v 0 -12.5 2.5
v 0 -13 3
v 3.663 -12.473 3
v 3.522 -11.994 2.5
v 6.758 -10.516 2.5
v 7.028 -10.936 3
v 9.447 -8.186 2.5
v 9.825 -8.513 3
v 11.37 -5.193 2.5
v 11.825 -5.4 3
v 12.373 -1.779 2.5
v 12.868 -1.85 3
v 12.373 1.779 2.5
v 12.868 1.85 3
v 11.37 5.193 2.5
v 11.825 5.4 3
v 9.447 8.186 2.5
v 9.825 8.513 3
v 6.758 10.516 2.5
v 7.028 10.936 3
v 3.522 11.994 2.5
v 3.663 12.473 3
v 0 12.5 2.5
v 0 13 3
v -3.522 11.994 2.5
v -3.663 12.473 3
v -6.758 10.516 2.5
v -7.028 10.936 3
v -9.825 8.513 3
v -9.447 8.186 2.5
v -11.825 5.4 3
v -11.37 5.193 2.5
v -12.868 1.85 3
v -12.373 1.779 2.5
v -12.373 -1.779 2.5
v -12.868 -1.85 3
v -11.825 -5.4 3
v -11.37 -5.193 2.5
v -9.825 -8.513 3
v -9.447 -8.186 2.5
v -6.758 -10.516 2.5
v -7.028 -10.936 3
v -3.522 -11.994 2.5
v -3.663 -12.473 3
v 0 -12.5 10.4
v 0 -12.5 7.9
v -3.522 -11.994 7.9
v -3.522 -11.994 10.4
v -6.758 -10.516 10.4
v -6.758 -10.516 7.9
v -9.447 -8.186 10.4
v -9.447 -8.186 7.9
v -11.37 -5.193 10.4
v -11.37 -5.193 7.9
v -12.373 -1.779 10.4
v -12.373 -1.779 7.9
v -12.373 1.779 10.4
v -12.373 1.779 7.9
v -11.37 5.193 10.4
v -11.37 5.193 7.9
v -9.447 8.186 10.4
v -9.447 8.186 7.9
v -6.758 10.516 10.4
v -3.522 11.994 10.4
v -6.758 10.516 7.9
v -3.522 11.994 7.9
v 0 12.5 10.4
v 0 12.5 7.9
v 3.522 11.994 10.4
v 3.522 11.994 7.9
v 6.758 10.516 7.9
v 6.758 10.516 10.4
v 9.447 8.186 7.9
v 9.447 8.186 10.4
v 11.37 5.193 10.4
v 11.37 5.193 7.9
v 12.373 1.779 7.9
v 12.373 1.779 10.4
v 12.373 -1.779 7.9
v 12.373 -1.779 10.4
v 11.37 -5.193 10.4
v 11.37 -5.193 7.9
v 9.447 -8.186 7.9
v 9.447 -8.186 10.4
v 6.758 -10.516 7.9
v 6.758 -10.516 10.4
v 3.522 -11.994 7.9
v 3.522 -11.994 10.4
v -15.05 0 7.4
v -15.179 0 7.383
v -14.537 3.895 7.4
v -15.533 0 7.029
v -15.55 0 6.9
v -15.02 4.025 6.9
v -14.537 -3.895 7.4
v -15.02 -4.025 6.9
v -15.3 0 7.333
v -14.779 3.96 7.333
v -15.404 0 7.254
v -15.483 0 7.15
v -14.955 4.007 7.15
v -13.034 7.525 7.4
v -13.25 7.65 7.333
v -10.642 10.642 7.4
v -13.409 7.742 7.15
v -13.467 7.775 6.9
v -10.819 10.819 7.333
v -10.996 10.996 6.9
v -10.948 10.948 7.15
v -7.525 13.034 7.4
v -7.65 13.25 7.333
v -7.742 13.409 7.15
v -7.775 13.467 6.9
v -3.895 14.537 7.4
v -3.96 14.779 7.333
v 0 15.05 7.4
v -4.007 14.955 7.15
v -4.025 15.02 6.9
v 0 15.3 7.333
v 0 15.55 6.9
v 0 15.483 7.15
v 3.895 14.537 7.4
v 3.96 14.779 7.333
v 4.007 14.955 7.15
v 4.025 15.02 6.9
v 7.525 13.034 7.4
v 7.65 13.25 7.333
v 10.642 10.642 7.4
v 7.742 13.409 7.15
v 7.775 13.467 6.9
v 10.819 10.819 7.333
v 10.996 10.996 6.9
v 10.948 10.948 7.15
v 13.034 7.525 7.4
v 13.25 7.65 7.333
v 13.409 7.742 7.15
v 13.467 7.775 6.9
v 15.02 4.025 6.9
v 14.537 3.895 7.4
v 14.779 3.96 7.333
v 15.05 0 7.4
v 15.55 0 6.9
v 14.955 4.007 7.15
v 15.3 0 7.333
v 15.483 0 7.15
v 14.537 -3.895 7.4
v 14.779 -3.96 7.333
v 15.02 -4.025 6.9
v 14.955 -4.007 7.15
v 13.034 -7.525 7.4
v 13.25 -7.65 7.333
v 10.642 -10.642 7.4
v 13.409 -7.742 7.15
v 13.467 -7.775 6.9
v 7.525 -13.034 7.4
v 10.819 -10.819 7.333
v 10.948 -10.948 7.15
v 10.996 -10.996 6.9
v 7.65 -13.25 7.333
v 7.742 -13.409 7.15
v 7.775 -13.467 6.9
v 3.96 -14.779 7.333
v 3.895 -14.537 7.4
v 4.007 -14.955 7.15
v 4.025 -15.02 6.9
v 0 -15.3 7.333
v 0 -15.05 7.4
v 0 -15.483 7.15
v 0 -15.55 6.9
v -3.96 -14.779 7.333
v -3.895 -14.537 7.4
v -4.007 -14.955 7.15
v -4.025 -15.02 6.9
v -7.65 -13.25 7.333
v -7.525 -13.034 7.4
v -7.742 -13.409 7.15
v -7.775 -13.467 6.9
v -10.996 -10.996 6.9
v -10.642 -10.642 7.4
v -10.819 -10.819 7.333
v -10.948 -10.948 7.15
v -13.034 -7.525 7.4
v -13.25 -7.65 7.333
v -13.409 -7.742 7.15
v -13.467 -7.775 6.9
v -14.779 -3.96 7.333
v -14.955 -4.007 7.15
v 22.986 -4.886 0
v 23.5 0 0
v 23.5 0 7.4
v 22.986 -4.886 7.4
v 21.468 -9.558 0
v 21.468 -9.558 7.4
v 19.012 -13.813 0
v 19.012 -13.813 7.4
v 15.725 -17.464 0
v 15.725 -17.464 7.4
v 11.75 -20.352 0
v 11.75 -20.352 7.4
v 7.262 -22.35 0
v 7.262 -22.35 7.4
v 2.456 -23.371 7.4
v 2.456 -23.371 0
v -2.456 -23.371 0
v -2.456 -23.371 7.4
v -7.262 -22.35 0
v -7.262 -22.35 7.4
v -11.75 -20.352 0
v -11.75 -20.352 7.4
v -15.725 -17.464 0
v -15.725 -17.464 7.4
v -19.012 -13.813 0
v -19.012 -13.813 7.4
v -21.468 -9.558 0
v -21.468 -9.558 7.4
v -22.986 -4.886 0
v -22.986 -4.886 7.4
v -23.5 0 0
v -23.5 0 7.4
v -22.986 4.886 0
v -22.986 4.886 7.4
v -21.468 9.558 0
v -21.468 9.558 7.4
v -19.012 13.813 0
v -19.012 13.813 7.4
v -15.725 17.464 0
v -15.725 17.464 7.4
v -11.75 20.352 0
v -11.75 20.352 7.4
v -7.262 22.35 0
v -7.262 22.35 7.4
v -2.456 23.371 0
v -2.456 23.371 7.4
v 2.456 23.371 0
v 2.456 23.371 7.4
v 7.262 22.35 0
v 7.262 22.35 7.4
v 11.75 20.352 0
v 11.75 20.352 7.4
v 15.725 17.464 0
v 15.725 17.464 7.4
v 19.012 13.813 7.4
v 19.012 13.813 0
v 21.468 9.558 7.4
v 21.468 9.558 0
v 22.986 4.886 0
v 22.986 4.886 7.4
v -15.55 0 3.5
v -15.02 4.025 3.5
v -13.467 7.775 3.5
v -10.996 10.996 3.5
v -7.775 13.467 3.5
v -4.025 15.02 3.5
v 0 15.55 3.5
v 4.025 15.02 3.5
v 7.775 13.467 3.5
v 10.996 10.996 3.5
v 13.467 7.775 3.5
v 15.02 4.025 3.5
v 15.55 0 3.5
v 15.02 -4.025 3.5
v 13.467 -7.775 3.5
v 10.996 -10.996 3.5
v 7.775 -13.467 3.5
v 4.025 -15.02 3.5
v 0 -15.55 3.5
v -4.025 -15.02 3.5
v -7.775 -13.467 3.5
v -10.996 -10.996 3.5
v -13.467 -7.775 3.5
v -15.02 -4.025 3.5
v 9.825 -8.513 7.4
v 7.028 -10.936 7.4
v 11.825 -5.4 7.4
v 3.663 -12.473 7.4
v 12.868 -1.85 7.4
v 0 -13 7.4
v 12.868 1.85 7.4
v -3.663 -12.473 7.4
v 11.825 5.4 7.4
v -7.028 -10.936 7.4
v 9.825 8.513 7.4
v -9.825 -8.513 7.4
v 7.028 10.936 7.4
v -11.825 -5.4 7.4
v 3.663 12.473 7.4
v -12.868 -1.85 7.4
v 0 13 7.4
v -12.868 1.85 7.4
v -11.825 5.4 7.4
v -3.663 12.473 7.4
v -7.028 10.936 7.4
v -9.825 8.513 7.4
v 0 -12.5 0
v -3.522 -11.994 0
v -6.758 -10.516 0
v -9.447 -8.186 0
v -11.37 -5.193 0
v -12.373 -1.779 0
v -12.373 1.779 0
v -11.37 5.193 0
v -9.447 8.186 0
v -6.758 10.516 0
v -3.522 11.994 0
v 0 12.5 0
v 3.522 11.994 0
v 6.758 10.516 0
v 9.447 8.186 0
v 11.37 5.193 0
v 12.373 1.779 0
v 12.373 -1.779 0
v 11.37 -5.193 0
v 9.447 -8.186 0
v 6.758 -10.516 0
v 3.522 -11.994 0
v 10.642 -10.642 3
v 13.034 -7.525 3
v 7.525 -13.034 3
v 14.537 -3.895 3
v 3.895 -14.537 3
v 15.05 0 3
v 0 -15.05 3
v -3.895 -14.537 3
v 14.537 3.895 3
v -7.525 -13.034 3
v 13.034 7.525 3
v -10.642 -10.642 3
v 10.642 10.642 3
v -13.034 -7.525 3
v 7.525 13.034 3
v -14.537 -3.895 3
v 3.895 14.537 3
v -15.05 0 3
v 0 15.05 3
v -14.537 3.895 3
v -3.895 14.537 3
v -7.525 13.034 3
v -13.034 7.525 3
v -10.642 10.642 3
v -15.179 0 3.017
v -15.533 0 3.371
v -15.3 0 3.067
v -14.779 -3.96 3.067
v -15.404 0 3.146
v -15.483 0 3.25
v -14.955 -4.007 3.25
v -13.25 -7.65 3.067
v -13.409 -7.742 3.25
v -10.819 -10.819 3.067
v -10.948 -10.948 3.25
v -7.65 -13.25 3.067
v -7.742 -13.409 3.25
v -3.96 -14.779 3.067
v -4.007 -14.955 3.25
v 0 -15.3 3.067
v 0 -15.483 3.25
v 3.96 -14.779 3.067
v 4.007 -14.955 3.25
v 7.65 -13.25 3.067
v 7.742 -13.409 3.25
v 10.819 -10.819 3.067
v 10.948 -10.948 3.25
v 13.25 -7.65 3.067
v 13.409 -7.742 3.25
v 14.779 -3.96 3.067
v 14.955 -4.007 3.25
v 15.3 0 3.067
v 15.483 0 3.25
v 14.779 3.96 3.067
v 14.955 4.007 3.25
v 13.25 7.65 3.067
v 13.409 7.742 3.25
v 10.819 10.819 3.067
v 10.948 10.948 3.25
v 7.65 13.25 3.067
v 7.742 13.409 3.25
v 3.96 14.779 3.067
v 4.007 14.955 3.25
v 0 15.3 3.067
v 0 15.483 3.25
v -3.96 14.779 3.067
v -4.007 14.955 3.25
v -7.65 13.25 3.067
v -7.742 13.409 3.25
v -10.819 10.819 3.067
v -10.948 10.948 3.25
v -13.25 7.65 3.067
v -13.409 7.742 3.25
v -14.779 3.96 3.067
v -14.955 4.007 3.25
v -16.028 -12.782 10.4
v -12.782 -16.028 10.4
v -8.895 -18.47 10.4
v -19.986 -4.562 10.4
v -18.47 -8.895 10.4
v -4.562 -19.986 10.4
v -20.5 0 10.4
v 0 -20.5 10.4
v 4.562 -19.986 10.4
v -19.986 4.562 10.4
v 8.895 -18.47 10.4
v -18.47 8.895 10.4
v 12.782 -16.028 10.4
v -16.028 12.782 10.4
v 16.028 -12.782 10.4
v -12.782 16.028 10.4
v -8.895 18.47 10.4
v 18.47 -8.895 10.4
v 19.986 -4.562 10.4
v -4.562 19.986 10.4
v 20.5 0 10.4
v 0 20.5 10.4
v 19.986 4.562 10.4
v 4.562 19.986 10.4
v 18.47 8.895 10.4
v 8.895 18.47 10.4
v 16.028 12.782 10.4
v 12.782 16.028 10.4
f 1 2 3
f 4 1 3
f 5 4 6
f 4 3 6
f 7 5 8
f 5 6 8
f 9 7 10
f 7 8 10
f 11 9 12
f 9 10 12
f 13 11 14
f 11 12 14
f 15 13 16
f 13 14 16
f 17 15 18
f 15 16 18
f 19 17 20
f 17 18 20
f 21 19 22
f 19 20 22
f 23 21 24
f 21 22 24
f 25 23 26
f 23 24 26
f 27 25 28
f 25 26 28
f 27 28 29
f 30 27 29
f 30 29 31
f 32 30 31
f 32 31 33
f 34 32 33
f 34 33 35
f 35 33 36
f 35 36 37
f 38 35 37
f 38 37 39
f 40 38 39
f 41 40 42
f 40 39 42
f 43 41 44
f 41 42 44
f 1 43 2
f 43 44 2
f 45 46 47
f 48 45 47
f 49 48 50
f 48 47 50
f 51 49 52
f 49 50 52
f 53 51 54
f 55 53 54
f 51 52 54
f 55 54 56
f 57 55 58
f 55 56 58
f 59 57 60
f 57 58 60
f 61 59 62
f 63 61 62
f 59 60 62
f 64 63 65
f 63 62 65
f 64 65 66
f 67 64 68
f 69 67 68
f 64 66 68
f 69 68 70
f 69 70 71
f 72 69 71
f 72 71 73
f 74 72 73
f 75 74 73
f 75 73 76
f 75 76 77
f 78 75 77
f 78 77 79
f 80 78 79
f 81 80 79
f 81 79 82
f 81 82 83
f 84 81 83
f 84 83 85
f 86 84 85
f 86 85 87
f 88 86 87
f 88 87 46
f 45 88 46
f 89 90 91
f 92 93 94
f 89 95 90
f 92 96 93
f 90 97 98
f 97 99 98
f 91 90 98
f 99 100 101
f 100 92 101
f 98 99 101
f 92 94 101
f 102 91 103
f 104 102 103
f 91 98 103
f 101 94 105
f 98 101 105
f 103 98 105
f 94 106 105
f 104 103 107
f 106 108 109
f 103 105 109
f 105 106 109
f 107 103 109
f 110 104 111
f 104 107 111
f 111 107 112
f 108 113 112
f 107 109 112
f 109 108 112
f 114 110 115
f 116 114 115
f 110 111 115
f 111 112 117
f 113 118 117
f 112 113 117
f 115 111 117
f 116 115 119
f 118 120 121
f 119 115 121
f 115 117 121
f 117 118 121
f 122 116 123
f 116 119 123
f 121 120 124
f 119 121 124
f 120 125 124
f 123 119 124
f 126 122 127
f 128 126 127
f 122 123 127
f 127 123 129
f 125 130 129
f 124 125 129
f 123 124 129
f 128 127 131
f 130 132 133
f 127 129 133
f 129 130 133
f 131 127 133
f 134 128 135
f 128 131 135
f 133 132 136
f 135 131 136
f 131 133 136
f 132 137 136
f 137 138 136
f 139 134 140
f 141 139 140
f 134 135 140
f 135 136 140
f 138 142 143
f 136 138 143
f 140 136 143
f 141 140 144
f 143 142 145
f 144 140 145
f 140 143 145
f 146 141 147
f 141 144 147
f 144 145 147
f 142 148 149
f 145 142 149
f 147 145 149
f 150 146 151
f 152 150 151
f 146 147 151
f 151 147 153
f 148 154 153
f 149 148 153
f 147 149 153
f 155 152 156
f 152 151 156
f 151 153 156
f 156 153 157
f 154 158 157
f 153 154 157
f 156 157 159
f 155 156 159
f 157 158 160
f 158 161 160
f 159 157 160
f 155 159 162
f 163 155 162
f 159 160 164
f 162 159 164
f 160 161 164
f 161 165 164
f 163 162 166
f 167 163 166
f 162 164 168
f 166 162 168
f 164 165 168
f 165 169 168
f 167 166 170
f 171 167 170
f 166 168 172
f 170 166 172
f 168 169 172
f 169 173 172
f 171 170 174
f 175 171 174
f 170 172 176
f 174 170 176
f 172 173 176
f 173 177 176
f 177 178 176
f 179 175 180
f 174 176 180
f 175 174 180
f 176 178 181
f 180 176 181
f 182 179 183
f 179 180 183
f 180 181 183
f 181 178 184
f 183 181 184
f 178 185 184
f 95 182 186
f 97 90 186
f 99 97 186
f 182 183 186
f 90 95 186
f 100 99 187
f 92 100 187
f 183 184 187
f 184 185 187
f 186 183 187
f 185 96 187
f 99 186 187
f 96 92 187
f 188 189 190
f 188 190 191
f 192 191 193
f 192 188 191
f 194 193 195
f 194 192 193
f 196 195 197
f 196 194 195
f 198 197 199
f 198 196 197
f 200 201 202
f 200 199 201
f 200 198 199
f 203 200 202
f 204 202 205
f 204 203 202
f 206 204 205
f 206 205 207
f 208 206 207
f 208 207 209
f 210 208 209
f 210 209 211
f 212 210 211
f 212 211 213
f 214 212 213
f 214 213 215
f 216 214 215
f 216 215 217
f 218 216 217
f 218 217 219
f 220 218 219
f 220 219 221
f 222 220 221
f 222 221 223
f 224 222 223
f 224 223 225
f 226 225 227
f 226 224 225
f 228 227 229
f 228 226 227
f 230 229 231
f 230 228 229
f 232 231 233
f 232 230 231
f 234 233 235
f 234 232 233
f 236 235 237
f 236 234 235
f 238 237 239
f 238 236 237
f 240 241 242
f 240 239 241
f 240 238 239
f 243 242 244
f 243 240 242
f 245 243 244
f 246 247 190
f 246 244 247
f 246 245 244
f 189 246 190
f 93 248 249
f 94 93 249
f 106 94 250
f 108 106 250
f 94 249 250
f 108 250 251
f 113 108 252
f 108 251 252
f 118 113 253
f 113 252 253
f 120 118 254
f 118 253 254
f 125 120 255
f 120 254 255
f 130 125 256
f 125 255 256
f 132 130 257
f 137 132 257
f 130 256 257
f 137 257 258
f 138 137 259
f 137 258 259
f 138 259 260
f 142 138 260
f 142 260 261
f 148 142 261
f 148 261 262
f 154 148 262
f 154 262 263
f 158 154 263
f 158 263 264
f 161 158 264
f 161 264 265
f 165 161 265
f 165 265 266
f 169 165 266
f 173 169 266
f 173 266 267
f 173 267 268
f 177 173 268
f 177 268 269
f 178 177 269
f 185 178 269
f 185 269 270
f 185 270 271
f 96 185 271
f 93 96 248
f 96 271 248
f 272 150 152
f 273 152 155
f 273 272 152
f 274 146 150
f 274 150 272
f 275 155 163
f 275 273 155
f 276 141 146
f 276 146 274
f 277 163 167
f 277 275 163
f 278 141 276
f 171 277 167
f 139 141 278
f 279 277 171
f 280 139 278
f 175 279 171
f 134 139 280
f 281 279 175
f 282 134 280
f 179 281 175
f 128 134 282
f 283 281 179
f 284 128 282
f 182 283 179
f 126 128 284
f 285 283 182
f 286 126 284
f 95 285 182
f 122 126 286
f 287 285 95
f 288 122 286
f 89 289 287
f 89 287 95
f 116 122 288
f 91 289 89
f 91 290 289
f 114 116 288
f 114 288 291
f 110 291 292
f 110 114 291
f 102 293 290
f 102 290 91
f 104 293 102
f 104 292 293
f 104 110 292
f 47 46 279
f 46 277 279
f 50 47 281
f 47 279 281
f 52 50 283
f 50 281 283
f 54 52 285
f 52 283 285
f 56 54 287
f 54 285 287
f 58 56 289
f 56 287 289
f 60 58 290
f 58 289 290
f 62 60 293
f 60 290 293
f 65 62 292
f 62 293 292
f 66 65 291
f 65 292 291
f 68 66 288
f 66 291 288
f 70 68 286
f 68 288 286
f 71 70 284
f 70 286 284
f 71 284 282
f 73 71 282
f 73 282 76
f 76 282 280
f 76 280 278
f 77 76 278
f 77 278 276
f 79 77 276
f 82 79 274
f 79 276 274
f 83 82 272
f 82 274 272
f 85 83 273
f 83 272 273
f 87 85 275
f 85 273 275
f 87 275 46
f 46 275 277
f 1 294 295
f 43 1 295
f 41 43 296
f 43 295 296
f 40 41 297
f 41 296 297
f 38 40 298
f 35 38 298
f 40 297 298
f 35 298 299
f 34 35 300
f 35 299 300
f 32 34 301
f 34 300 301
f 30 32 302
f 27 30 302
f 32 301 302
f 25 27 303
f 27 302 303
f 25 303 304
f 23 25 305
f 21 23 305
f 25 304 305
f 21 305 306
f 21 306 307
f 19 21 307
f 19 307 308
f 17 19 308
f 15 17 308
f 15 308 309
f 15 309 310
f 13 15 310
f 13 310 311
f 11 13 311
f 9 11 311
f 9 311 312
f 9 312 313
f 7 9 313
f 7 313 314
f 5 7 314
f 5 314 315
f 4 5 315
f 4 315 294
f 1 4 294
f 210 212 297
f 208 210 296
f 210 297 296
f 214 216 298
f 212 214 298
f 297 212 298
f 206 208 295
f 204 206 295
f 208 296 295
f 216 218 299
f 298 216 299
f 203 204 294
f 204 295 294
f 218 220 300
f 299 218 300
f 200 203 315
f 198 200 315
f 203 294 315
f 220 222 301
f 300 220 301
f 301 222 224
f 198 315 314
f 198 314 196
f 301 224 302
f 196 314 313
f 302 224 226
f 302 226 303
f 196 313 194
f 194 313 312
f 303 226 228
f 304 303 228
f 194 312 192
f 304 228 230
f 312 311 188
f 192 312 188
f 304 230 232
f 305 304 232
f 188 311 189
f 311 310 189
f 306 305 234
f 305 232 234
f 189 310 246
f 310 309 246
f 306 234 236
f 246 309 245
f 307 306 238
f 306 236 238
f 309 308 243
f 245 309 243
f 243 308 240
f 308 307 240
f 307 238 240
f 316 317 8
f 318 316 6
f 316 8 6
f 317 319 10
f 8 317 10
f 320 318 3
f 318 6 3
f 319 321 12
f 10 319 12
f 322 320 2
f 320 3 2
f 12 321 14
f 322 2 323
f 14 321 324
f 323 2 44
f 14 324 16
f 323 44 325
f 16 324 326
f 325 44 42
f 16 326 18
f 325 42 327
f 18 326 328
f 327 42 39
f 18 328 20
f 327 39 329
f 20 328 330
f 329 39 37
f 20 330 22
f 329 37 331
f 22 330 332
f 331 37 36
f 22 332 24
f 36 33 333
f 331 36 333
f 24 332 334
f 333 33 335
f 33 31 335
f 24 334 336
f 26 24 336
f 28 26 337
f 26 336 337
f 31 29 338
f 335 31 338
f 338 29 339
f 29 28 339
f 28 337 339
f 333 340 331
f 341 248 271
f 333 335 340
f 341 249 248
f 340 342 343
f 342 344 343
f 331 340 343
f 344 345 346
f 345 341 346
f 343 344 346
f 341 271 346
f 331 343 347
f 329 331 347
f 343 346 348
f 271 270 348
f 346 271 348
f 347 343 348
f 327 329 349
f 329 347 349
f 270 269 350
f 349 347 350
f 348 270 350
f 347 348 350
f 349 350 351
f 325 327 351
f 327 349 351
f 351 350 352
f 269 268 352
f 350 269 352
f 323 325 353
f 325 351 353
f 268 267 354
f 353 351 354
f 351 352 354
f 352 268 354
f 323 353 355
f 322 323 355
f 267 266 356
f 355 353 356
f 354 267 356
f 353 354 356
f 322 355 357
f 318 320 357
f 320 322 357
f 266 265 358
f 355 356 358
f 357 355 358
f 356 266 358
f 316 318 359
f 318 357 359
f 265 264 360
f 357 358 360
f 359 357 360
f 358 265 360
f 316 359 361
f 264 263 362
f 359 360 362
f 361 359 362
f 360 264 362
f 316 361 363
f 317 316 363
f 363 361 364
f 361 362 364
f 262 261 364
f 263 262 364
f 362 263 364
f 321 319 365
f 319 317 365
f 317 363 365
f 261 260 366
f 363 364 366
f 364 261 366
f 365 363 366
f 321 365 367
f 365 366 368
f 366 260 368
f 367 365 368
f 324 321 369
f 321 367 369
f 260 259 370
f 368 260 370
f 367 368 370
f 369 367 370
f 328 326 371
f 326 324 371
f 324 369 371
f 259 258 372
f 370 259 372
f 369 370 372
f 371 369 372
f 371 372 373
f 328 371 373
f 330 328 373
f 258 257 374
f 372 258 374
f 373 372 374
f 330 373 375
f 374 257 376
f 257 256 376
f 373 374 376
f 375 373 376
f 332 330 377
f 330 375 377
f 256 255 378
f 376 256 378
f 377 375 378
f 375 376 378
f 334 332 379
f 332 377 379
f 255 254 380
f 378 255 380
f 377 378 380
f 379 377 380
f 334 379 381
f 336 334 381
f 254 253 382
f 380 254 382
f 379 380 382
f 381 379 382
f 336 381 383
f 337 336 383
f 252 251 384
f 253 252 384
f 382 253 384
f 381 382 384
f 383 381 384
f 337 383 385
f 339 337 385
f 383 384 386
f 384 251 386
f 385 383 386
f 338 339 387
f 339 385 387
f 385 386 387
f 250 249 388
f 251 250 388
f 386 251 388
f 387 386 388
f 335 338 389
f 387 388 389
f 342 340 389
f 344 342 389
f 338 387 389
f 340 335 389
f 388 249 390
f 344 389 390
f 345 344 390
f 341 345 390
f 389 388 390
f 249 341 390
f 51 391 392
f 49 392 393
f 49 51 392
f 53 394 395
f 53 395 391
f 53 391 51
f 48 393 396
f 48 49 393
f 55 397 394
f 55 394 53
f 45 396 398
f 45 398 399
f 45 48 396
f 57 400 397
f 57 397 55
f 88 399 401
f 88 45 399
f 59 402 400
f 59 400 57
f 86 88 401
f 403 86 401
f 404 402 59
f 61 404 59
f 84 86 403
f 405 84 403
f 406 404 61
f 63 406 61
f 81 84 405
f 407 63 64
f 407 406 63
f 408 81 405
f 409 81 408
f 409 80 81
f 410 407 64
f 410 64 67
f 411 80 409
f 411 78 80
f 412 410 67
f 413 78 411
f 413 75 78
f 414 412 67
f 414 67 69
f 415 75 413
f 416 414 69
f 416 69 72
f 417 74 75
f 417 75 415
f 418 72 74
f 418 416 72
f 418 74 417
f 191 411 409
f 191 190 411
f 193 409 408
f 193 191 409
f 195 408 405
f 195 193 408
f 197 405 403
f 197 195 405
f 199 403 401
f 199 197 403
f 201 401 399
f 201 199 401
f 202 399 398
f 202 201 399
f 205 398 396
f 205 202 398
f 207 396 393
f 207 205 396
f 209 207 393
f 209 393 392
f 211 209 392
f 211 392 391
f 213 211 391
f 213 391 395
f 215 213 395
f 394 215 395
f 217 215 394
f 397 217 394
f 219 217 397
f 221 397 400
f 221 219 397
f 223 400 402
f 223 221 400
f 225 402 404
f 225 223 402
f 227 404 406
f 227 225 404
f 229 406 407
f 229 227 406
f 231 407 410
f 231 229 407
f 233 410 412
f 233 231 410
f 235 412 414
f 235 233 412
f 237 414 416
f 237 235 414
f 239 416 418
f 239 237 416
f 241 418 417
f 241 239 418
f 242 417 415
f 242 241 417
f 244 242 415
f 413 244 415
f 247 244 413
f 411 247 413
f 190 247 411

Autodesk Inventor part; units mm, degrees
ref_plane "YZ Plane" through (0, 0, 0) normal (1, 0, 0) x (0, 1, 0)
ref_plane "XZ Plane" through (0, 0, 0) normal (0, 1, 0) x (-1, 0, 0)
ref_plane "XY Plane" through (0, 0, 0) normal (0, 0, 1) x (1, 0, 0)
sketch "草圖1" plane through (0, 0, 0) normal (0, 0, 1) x (1, 0, 0)
  circle A0 centre (0, 0) radius 23.5
  dimension "d0" = 47
extrude "擠出1" add sketch "草圖1" along normal blind 10.4
chamfer "倒角1" distance 3 angle 45 1 edges at (-23.5, 0, 10.4)
sketch "草圖3" plane through (0, 0, 10.4) normal (0, 0, 1) x (1, 0, 0)
  circle A0 centre (0, 0) radius 20.5 projected
hole "孔1" at (0, 0, 10.4) direction (0, 0, -1) diameter 25 end through all
sketch "草圖4" plane through (0, 0, 0) normal (0, 1, 0) x (-1, 0, 0)
  line L0 (0, 0) -> (0, 3)
  line L1 (-15.55, 7.4) -> (15.55, 7.4)
  line L2 (15.55, 7.4) -> (15.55, 3)
  line L3 (15.55, 3) -> (-15.55, 3)
  line L4 (-15.55, 3) -> (-15.55, 7.4)
  line L5 (0, 7.4) -> (0, 3)
  dimension "d13" = 3
  dimension "d14" = 31.1
  dimension "d15" = 4.4
revolve "迴轉1" cut sketch "草圖4" angle 360 about axis through (0, 0, 7.4) along (0, 0, -1) contours L1 L2 L3 L5
fillet "圓角1" radius 0.5 2 edges at (15.55, 0, 3) (15.55, 0, 7.4)
chamfer "倒角2" distance 0.5 angle 45 2 edges at (0, 12.5, 7.4) (0, 12.5, 3)
properties part number "機械油封墊片-KMB601PT-t10.4"
